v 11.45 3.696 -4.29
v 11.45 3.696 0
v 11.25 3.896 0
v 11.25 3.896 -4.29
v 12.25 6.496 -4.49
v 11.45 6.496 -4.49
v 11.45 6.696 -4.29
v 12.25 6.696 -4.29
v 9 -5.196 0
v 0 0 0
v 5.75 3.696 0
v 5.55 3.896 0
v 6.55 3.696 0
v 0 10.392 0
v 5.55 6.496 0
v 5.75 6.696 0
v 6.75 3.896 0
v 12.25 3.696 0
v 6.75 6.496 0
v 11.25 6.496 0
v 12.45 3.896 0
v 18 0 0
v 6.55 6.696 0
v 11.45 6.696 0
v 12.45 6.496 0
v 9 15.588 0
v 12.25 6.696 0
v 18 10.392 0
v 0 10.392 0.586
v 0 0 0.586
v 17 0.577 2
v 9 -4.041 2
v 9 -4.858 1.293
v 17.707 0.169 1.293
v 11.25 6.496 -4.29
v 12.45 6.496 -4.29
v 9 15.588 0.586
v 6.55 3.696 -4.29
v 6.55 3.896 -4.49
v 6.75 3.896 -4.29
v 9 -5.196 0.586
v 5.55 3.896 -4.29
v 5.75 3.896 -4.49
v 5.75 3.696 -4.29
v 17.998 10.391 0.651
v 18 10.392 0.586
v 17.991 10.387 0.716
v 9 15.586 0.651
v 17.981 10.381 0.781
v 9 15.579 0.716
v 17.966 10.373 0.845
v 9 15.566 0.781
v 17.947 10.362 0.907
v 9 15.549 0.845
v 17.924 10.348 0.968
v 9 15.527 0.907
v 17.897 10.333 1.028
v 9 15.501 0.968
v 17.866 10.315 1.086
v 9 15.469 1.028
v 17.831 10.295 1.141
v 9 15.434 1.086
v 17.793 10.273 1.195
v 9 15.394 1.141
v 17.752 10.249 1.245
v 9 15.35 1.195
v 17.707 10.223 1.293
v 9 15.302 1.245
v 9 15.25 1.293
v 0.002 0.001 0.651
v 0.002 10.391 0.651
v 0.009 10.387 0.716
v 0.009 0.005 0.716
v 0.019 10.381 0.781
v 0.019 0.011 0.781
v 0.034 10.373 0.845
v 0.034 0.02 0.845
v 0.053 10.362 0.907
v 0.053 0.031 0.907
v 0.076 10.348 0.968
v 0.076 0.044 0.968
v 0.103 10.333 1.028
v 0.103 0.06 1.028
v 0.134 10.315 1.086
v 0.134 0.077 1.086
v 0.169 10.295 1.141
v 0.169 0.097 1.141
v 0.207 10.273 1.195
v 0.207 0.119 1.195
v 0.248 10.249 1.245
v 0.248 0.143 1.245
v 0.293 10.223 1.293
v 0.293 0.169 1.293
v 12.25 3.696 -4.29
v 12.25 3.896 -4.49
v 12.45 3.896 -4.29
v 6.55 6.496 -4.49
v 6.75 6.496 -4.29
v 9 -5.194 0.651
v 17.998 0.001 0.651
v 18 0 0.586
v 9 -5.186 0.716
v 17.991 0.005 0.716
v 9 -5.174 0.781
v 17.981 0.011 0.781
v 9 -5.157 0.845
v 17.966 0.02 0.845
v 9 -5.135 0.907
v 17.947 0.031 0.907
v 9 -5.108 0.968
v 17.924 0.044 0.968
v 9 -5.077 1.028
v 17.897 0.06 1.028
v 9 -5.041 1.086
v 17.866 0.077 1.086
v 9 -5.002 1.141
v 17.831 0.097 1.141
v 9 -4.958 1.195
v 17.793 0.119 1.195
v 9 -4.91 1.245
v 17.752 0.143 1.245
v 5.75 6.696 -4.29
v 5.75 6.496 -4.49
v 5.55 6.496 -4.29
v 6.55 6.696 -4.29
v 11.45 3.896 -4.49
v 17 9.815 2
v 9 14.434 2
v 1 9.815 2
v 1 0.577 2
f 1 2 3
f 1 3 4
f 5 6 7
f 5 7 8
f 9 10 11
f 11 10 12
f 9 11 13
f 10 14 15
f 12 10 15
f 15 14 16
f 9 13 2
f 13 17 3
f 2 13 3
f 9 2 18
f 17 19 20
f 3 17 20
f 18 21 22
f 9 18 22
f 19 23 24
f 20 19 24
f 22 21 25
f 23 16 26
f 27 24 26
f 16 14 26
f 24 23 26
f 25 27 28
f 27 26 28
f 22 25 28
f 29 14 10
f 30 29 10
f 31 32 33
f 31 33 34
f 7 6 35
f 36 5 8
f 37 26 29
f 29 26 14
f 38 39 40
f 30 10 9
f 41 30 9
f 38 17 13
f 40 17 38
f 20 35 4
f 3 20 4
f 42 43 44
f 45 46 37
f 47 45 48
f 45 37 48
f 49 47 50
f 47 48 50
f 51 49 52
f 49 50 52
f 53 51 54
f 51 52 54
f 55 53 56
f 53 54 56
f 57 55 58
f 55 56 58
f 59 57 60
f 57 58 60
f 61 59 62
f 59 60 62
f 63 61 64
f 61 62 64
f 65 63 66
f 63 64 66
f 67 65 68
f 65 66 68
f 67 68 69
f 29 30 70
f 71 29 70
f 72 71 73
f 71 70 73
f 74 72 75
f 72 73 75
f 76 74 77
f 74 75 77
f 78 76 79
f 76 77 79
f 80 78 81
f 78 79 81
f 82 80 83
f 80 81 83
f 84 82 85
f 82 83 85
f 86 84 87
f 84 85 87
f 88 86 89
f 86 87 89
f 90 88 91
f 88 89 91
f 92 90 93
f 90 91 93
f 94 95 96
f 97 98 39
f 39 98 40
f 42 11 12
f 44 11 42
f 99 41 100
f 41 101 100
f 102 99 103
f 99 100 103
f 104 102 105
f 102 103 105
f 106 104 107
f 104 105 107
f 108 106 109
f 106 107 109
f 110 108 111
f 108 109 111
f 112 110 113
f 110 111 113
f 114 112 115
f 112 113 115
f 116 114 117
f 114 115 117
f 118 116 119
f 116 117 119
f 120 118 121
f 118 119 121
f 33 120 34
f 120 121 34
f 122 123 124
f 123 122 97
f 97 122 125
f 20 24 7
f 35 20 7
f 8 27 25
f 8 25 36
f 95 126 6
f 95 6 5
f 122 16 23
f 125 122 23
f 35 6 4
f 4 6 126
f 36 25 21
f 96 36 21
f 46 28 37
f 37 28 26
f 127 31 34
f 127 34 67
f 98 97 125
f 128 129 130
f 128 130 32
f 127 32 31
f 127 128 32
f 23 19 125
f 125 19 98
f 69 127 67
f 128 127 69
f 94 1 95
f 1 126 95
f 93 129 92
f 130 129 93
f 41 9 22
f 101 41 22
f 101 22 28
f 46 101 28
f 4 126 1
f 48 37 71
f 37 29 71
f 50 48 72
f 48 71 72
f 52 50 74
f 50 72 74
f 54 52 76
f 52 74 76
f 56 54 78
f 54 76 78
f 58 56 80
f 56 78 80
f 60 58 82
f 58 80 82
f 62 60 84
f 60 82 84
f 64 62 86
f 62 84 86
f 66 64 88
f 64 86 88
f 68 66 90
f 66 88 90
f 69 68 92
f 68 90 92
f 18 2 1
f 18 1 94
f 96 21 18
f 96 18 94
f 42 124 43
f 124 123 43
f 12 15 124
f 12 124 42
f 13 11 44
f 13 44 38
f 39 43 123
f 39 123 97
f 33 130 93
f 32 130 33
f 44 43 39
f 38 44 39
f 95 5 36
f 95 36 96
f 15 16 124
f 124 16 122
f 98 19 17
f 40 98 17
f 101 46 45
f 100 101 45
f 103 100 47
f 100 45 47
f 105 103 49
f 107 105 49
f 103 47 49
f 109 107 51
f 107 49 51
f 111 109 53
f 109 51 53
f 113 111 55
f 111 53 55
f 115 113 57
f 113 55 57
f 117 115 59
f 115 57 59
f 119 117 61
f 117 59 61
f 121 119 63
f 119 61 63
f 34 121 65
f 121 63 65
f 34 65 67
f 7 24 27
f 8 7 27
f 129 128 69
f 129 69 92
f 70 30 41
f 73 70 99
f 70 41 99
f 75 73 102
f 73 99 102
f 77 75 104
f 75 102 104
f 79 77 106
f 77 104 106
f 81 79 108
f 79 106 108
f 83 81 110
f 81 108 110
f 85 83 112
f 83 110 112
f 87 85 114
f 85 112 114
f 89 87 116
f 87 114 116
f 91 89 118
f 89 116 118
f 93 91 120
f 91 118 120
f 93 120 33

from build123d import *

# Parameters (mm, degrees)
PAD_DEPTH       = 2
CHAMFER_SIZE    = 1
FILLET_R        = 1
SKETCH002_W     = 1.2
SKETCH002_H     = 3
PAD001_DEPTH    = 4.5
CHAMFER001_SIZE = 0.2


with BuildPart() as part:
    # Sketch → Pad (new body)
    with BuildSketch(Plane.XY):
        Polygon((17.999992, 0), (17.999992, 10.3923), (8.999996, 15.58845), (0, 10.3923), (0, 0), (8.999996, -5.19615), align=None)
    extrude(amount=PAD_DEPTH)

    # Chamfer
    chamfer_edges = [part.edges().sort_by_distance(p)[0] for p in [
        (13.499994, -2.598075, 2),
        (4.499998, -2.598075, 2),
        (17.999992, 5.19615, 2),
        (13.499994, 12.990375, 2),
        (0, 5.19615, 2),
        (4.499998, 12.990375, 2),
    ]]
    chamfer(chamfer_edges, length=CHAMFER_SIZE)

    # Fillet
    fillet_edges = [part.edges().sort_by_distance(p)[0] for p in [
        (13.499994, 12.990375, 1),
        (13.499994, -2.598075, 1),
        (17.999992, 5.19615, 1),
        (4.499998, -2.598075, 1),
        (0, 5.19615, 1),
        (4.499998, 12.990375, 1),
    ]]
    fillet(fillet_edges, radius=FILLET_R)

    # Sketch002 → Pad001 (join)
    with BuildSketch(Plane(origin=(0, 0, 0.01), x_dir=(1, 0, 0), z_dir=(0, 0, -1))):
        with Locations((6.149996, -5.19615)):
            Rectangle(SKETCH002_W, SKETCH002_H)
        with Locations((11.849996, -5.19615)):
            Rectangle(SKETCH002_W, SKETCH002_H)
    extrude(amount=PAD001_DEPTH)

    # Chamfer001
    chamfer001_edges = [part.edges().sort_by_distance(p)[0] for p in [
        (11.849996, 3.69615, -4.49),
        (11.249996, 5.19615, -4.49),
        (11.849996, 6.69615, -4.49),
        (12.449996, 5.19615, -4.49),
        (11.249996, 3.69615, -2.245),
        (11.249996, 6.69615, -2.245),
        (12.449996, 3.69615, -2.245),
        (12.449996, 6.69615, -2.245),
        (5.549996, 5.19615, -4.49),
        (6.149996, 3.69615, -4.49),
        (6.749996, 5.19615, -4.49),
        (6.149996, 6.69615, -4.49),
        (5.549996, 3.69615, -2.245),
        (6.749996, 3.69615, -2.245),
        (5.549996, 6.69615, -2.245),
        (6.749996, 6.69615, -2.245),
    ]]
    chamfer(chamfer001_edges, length=CHAMFER001_SIZE)


solid = part.part
